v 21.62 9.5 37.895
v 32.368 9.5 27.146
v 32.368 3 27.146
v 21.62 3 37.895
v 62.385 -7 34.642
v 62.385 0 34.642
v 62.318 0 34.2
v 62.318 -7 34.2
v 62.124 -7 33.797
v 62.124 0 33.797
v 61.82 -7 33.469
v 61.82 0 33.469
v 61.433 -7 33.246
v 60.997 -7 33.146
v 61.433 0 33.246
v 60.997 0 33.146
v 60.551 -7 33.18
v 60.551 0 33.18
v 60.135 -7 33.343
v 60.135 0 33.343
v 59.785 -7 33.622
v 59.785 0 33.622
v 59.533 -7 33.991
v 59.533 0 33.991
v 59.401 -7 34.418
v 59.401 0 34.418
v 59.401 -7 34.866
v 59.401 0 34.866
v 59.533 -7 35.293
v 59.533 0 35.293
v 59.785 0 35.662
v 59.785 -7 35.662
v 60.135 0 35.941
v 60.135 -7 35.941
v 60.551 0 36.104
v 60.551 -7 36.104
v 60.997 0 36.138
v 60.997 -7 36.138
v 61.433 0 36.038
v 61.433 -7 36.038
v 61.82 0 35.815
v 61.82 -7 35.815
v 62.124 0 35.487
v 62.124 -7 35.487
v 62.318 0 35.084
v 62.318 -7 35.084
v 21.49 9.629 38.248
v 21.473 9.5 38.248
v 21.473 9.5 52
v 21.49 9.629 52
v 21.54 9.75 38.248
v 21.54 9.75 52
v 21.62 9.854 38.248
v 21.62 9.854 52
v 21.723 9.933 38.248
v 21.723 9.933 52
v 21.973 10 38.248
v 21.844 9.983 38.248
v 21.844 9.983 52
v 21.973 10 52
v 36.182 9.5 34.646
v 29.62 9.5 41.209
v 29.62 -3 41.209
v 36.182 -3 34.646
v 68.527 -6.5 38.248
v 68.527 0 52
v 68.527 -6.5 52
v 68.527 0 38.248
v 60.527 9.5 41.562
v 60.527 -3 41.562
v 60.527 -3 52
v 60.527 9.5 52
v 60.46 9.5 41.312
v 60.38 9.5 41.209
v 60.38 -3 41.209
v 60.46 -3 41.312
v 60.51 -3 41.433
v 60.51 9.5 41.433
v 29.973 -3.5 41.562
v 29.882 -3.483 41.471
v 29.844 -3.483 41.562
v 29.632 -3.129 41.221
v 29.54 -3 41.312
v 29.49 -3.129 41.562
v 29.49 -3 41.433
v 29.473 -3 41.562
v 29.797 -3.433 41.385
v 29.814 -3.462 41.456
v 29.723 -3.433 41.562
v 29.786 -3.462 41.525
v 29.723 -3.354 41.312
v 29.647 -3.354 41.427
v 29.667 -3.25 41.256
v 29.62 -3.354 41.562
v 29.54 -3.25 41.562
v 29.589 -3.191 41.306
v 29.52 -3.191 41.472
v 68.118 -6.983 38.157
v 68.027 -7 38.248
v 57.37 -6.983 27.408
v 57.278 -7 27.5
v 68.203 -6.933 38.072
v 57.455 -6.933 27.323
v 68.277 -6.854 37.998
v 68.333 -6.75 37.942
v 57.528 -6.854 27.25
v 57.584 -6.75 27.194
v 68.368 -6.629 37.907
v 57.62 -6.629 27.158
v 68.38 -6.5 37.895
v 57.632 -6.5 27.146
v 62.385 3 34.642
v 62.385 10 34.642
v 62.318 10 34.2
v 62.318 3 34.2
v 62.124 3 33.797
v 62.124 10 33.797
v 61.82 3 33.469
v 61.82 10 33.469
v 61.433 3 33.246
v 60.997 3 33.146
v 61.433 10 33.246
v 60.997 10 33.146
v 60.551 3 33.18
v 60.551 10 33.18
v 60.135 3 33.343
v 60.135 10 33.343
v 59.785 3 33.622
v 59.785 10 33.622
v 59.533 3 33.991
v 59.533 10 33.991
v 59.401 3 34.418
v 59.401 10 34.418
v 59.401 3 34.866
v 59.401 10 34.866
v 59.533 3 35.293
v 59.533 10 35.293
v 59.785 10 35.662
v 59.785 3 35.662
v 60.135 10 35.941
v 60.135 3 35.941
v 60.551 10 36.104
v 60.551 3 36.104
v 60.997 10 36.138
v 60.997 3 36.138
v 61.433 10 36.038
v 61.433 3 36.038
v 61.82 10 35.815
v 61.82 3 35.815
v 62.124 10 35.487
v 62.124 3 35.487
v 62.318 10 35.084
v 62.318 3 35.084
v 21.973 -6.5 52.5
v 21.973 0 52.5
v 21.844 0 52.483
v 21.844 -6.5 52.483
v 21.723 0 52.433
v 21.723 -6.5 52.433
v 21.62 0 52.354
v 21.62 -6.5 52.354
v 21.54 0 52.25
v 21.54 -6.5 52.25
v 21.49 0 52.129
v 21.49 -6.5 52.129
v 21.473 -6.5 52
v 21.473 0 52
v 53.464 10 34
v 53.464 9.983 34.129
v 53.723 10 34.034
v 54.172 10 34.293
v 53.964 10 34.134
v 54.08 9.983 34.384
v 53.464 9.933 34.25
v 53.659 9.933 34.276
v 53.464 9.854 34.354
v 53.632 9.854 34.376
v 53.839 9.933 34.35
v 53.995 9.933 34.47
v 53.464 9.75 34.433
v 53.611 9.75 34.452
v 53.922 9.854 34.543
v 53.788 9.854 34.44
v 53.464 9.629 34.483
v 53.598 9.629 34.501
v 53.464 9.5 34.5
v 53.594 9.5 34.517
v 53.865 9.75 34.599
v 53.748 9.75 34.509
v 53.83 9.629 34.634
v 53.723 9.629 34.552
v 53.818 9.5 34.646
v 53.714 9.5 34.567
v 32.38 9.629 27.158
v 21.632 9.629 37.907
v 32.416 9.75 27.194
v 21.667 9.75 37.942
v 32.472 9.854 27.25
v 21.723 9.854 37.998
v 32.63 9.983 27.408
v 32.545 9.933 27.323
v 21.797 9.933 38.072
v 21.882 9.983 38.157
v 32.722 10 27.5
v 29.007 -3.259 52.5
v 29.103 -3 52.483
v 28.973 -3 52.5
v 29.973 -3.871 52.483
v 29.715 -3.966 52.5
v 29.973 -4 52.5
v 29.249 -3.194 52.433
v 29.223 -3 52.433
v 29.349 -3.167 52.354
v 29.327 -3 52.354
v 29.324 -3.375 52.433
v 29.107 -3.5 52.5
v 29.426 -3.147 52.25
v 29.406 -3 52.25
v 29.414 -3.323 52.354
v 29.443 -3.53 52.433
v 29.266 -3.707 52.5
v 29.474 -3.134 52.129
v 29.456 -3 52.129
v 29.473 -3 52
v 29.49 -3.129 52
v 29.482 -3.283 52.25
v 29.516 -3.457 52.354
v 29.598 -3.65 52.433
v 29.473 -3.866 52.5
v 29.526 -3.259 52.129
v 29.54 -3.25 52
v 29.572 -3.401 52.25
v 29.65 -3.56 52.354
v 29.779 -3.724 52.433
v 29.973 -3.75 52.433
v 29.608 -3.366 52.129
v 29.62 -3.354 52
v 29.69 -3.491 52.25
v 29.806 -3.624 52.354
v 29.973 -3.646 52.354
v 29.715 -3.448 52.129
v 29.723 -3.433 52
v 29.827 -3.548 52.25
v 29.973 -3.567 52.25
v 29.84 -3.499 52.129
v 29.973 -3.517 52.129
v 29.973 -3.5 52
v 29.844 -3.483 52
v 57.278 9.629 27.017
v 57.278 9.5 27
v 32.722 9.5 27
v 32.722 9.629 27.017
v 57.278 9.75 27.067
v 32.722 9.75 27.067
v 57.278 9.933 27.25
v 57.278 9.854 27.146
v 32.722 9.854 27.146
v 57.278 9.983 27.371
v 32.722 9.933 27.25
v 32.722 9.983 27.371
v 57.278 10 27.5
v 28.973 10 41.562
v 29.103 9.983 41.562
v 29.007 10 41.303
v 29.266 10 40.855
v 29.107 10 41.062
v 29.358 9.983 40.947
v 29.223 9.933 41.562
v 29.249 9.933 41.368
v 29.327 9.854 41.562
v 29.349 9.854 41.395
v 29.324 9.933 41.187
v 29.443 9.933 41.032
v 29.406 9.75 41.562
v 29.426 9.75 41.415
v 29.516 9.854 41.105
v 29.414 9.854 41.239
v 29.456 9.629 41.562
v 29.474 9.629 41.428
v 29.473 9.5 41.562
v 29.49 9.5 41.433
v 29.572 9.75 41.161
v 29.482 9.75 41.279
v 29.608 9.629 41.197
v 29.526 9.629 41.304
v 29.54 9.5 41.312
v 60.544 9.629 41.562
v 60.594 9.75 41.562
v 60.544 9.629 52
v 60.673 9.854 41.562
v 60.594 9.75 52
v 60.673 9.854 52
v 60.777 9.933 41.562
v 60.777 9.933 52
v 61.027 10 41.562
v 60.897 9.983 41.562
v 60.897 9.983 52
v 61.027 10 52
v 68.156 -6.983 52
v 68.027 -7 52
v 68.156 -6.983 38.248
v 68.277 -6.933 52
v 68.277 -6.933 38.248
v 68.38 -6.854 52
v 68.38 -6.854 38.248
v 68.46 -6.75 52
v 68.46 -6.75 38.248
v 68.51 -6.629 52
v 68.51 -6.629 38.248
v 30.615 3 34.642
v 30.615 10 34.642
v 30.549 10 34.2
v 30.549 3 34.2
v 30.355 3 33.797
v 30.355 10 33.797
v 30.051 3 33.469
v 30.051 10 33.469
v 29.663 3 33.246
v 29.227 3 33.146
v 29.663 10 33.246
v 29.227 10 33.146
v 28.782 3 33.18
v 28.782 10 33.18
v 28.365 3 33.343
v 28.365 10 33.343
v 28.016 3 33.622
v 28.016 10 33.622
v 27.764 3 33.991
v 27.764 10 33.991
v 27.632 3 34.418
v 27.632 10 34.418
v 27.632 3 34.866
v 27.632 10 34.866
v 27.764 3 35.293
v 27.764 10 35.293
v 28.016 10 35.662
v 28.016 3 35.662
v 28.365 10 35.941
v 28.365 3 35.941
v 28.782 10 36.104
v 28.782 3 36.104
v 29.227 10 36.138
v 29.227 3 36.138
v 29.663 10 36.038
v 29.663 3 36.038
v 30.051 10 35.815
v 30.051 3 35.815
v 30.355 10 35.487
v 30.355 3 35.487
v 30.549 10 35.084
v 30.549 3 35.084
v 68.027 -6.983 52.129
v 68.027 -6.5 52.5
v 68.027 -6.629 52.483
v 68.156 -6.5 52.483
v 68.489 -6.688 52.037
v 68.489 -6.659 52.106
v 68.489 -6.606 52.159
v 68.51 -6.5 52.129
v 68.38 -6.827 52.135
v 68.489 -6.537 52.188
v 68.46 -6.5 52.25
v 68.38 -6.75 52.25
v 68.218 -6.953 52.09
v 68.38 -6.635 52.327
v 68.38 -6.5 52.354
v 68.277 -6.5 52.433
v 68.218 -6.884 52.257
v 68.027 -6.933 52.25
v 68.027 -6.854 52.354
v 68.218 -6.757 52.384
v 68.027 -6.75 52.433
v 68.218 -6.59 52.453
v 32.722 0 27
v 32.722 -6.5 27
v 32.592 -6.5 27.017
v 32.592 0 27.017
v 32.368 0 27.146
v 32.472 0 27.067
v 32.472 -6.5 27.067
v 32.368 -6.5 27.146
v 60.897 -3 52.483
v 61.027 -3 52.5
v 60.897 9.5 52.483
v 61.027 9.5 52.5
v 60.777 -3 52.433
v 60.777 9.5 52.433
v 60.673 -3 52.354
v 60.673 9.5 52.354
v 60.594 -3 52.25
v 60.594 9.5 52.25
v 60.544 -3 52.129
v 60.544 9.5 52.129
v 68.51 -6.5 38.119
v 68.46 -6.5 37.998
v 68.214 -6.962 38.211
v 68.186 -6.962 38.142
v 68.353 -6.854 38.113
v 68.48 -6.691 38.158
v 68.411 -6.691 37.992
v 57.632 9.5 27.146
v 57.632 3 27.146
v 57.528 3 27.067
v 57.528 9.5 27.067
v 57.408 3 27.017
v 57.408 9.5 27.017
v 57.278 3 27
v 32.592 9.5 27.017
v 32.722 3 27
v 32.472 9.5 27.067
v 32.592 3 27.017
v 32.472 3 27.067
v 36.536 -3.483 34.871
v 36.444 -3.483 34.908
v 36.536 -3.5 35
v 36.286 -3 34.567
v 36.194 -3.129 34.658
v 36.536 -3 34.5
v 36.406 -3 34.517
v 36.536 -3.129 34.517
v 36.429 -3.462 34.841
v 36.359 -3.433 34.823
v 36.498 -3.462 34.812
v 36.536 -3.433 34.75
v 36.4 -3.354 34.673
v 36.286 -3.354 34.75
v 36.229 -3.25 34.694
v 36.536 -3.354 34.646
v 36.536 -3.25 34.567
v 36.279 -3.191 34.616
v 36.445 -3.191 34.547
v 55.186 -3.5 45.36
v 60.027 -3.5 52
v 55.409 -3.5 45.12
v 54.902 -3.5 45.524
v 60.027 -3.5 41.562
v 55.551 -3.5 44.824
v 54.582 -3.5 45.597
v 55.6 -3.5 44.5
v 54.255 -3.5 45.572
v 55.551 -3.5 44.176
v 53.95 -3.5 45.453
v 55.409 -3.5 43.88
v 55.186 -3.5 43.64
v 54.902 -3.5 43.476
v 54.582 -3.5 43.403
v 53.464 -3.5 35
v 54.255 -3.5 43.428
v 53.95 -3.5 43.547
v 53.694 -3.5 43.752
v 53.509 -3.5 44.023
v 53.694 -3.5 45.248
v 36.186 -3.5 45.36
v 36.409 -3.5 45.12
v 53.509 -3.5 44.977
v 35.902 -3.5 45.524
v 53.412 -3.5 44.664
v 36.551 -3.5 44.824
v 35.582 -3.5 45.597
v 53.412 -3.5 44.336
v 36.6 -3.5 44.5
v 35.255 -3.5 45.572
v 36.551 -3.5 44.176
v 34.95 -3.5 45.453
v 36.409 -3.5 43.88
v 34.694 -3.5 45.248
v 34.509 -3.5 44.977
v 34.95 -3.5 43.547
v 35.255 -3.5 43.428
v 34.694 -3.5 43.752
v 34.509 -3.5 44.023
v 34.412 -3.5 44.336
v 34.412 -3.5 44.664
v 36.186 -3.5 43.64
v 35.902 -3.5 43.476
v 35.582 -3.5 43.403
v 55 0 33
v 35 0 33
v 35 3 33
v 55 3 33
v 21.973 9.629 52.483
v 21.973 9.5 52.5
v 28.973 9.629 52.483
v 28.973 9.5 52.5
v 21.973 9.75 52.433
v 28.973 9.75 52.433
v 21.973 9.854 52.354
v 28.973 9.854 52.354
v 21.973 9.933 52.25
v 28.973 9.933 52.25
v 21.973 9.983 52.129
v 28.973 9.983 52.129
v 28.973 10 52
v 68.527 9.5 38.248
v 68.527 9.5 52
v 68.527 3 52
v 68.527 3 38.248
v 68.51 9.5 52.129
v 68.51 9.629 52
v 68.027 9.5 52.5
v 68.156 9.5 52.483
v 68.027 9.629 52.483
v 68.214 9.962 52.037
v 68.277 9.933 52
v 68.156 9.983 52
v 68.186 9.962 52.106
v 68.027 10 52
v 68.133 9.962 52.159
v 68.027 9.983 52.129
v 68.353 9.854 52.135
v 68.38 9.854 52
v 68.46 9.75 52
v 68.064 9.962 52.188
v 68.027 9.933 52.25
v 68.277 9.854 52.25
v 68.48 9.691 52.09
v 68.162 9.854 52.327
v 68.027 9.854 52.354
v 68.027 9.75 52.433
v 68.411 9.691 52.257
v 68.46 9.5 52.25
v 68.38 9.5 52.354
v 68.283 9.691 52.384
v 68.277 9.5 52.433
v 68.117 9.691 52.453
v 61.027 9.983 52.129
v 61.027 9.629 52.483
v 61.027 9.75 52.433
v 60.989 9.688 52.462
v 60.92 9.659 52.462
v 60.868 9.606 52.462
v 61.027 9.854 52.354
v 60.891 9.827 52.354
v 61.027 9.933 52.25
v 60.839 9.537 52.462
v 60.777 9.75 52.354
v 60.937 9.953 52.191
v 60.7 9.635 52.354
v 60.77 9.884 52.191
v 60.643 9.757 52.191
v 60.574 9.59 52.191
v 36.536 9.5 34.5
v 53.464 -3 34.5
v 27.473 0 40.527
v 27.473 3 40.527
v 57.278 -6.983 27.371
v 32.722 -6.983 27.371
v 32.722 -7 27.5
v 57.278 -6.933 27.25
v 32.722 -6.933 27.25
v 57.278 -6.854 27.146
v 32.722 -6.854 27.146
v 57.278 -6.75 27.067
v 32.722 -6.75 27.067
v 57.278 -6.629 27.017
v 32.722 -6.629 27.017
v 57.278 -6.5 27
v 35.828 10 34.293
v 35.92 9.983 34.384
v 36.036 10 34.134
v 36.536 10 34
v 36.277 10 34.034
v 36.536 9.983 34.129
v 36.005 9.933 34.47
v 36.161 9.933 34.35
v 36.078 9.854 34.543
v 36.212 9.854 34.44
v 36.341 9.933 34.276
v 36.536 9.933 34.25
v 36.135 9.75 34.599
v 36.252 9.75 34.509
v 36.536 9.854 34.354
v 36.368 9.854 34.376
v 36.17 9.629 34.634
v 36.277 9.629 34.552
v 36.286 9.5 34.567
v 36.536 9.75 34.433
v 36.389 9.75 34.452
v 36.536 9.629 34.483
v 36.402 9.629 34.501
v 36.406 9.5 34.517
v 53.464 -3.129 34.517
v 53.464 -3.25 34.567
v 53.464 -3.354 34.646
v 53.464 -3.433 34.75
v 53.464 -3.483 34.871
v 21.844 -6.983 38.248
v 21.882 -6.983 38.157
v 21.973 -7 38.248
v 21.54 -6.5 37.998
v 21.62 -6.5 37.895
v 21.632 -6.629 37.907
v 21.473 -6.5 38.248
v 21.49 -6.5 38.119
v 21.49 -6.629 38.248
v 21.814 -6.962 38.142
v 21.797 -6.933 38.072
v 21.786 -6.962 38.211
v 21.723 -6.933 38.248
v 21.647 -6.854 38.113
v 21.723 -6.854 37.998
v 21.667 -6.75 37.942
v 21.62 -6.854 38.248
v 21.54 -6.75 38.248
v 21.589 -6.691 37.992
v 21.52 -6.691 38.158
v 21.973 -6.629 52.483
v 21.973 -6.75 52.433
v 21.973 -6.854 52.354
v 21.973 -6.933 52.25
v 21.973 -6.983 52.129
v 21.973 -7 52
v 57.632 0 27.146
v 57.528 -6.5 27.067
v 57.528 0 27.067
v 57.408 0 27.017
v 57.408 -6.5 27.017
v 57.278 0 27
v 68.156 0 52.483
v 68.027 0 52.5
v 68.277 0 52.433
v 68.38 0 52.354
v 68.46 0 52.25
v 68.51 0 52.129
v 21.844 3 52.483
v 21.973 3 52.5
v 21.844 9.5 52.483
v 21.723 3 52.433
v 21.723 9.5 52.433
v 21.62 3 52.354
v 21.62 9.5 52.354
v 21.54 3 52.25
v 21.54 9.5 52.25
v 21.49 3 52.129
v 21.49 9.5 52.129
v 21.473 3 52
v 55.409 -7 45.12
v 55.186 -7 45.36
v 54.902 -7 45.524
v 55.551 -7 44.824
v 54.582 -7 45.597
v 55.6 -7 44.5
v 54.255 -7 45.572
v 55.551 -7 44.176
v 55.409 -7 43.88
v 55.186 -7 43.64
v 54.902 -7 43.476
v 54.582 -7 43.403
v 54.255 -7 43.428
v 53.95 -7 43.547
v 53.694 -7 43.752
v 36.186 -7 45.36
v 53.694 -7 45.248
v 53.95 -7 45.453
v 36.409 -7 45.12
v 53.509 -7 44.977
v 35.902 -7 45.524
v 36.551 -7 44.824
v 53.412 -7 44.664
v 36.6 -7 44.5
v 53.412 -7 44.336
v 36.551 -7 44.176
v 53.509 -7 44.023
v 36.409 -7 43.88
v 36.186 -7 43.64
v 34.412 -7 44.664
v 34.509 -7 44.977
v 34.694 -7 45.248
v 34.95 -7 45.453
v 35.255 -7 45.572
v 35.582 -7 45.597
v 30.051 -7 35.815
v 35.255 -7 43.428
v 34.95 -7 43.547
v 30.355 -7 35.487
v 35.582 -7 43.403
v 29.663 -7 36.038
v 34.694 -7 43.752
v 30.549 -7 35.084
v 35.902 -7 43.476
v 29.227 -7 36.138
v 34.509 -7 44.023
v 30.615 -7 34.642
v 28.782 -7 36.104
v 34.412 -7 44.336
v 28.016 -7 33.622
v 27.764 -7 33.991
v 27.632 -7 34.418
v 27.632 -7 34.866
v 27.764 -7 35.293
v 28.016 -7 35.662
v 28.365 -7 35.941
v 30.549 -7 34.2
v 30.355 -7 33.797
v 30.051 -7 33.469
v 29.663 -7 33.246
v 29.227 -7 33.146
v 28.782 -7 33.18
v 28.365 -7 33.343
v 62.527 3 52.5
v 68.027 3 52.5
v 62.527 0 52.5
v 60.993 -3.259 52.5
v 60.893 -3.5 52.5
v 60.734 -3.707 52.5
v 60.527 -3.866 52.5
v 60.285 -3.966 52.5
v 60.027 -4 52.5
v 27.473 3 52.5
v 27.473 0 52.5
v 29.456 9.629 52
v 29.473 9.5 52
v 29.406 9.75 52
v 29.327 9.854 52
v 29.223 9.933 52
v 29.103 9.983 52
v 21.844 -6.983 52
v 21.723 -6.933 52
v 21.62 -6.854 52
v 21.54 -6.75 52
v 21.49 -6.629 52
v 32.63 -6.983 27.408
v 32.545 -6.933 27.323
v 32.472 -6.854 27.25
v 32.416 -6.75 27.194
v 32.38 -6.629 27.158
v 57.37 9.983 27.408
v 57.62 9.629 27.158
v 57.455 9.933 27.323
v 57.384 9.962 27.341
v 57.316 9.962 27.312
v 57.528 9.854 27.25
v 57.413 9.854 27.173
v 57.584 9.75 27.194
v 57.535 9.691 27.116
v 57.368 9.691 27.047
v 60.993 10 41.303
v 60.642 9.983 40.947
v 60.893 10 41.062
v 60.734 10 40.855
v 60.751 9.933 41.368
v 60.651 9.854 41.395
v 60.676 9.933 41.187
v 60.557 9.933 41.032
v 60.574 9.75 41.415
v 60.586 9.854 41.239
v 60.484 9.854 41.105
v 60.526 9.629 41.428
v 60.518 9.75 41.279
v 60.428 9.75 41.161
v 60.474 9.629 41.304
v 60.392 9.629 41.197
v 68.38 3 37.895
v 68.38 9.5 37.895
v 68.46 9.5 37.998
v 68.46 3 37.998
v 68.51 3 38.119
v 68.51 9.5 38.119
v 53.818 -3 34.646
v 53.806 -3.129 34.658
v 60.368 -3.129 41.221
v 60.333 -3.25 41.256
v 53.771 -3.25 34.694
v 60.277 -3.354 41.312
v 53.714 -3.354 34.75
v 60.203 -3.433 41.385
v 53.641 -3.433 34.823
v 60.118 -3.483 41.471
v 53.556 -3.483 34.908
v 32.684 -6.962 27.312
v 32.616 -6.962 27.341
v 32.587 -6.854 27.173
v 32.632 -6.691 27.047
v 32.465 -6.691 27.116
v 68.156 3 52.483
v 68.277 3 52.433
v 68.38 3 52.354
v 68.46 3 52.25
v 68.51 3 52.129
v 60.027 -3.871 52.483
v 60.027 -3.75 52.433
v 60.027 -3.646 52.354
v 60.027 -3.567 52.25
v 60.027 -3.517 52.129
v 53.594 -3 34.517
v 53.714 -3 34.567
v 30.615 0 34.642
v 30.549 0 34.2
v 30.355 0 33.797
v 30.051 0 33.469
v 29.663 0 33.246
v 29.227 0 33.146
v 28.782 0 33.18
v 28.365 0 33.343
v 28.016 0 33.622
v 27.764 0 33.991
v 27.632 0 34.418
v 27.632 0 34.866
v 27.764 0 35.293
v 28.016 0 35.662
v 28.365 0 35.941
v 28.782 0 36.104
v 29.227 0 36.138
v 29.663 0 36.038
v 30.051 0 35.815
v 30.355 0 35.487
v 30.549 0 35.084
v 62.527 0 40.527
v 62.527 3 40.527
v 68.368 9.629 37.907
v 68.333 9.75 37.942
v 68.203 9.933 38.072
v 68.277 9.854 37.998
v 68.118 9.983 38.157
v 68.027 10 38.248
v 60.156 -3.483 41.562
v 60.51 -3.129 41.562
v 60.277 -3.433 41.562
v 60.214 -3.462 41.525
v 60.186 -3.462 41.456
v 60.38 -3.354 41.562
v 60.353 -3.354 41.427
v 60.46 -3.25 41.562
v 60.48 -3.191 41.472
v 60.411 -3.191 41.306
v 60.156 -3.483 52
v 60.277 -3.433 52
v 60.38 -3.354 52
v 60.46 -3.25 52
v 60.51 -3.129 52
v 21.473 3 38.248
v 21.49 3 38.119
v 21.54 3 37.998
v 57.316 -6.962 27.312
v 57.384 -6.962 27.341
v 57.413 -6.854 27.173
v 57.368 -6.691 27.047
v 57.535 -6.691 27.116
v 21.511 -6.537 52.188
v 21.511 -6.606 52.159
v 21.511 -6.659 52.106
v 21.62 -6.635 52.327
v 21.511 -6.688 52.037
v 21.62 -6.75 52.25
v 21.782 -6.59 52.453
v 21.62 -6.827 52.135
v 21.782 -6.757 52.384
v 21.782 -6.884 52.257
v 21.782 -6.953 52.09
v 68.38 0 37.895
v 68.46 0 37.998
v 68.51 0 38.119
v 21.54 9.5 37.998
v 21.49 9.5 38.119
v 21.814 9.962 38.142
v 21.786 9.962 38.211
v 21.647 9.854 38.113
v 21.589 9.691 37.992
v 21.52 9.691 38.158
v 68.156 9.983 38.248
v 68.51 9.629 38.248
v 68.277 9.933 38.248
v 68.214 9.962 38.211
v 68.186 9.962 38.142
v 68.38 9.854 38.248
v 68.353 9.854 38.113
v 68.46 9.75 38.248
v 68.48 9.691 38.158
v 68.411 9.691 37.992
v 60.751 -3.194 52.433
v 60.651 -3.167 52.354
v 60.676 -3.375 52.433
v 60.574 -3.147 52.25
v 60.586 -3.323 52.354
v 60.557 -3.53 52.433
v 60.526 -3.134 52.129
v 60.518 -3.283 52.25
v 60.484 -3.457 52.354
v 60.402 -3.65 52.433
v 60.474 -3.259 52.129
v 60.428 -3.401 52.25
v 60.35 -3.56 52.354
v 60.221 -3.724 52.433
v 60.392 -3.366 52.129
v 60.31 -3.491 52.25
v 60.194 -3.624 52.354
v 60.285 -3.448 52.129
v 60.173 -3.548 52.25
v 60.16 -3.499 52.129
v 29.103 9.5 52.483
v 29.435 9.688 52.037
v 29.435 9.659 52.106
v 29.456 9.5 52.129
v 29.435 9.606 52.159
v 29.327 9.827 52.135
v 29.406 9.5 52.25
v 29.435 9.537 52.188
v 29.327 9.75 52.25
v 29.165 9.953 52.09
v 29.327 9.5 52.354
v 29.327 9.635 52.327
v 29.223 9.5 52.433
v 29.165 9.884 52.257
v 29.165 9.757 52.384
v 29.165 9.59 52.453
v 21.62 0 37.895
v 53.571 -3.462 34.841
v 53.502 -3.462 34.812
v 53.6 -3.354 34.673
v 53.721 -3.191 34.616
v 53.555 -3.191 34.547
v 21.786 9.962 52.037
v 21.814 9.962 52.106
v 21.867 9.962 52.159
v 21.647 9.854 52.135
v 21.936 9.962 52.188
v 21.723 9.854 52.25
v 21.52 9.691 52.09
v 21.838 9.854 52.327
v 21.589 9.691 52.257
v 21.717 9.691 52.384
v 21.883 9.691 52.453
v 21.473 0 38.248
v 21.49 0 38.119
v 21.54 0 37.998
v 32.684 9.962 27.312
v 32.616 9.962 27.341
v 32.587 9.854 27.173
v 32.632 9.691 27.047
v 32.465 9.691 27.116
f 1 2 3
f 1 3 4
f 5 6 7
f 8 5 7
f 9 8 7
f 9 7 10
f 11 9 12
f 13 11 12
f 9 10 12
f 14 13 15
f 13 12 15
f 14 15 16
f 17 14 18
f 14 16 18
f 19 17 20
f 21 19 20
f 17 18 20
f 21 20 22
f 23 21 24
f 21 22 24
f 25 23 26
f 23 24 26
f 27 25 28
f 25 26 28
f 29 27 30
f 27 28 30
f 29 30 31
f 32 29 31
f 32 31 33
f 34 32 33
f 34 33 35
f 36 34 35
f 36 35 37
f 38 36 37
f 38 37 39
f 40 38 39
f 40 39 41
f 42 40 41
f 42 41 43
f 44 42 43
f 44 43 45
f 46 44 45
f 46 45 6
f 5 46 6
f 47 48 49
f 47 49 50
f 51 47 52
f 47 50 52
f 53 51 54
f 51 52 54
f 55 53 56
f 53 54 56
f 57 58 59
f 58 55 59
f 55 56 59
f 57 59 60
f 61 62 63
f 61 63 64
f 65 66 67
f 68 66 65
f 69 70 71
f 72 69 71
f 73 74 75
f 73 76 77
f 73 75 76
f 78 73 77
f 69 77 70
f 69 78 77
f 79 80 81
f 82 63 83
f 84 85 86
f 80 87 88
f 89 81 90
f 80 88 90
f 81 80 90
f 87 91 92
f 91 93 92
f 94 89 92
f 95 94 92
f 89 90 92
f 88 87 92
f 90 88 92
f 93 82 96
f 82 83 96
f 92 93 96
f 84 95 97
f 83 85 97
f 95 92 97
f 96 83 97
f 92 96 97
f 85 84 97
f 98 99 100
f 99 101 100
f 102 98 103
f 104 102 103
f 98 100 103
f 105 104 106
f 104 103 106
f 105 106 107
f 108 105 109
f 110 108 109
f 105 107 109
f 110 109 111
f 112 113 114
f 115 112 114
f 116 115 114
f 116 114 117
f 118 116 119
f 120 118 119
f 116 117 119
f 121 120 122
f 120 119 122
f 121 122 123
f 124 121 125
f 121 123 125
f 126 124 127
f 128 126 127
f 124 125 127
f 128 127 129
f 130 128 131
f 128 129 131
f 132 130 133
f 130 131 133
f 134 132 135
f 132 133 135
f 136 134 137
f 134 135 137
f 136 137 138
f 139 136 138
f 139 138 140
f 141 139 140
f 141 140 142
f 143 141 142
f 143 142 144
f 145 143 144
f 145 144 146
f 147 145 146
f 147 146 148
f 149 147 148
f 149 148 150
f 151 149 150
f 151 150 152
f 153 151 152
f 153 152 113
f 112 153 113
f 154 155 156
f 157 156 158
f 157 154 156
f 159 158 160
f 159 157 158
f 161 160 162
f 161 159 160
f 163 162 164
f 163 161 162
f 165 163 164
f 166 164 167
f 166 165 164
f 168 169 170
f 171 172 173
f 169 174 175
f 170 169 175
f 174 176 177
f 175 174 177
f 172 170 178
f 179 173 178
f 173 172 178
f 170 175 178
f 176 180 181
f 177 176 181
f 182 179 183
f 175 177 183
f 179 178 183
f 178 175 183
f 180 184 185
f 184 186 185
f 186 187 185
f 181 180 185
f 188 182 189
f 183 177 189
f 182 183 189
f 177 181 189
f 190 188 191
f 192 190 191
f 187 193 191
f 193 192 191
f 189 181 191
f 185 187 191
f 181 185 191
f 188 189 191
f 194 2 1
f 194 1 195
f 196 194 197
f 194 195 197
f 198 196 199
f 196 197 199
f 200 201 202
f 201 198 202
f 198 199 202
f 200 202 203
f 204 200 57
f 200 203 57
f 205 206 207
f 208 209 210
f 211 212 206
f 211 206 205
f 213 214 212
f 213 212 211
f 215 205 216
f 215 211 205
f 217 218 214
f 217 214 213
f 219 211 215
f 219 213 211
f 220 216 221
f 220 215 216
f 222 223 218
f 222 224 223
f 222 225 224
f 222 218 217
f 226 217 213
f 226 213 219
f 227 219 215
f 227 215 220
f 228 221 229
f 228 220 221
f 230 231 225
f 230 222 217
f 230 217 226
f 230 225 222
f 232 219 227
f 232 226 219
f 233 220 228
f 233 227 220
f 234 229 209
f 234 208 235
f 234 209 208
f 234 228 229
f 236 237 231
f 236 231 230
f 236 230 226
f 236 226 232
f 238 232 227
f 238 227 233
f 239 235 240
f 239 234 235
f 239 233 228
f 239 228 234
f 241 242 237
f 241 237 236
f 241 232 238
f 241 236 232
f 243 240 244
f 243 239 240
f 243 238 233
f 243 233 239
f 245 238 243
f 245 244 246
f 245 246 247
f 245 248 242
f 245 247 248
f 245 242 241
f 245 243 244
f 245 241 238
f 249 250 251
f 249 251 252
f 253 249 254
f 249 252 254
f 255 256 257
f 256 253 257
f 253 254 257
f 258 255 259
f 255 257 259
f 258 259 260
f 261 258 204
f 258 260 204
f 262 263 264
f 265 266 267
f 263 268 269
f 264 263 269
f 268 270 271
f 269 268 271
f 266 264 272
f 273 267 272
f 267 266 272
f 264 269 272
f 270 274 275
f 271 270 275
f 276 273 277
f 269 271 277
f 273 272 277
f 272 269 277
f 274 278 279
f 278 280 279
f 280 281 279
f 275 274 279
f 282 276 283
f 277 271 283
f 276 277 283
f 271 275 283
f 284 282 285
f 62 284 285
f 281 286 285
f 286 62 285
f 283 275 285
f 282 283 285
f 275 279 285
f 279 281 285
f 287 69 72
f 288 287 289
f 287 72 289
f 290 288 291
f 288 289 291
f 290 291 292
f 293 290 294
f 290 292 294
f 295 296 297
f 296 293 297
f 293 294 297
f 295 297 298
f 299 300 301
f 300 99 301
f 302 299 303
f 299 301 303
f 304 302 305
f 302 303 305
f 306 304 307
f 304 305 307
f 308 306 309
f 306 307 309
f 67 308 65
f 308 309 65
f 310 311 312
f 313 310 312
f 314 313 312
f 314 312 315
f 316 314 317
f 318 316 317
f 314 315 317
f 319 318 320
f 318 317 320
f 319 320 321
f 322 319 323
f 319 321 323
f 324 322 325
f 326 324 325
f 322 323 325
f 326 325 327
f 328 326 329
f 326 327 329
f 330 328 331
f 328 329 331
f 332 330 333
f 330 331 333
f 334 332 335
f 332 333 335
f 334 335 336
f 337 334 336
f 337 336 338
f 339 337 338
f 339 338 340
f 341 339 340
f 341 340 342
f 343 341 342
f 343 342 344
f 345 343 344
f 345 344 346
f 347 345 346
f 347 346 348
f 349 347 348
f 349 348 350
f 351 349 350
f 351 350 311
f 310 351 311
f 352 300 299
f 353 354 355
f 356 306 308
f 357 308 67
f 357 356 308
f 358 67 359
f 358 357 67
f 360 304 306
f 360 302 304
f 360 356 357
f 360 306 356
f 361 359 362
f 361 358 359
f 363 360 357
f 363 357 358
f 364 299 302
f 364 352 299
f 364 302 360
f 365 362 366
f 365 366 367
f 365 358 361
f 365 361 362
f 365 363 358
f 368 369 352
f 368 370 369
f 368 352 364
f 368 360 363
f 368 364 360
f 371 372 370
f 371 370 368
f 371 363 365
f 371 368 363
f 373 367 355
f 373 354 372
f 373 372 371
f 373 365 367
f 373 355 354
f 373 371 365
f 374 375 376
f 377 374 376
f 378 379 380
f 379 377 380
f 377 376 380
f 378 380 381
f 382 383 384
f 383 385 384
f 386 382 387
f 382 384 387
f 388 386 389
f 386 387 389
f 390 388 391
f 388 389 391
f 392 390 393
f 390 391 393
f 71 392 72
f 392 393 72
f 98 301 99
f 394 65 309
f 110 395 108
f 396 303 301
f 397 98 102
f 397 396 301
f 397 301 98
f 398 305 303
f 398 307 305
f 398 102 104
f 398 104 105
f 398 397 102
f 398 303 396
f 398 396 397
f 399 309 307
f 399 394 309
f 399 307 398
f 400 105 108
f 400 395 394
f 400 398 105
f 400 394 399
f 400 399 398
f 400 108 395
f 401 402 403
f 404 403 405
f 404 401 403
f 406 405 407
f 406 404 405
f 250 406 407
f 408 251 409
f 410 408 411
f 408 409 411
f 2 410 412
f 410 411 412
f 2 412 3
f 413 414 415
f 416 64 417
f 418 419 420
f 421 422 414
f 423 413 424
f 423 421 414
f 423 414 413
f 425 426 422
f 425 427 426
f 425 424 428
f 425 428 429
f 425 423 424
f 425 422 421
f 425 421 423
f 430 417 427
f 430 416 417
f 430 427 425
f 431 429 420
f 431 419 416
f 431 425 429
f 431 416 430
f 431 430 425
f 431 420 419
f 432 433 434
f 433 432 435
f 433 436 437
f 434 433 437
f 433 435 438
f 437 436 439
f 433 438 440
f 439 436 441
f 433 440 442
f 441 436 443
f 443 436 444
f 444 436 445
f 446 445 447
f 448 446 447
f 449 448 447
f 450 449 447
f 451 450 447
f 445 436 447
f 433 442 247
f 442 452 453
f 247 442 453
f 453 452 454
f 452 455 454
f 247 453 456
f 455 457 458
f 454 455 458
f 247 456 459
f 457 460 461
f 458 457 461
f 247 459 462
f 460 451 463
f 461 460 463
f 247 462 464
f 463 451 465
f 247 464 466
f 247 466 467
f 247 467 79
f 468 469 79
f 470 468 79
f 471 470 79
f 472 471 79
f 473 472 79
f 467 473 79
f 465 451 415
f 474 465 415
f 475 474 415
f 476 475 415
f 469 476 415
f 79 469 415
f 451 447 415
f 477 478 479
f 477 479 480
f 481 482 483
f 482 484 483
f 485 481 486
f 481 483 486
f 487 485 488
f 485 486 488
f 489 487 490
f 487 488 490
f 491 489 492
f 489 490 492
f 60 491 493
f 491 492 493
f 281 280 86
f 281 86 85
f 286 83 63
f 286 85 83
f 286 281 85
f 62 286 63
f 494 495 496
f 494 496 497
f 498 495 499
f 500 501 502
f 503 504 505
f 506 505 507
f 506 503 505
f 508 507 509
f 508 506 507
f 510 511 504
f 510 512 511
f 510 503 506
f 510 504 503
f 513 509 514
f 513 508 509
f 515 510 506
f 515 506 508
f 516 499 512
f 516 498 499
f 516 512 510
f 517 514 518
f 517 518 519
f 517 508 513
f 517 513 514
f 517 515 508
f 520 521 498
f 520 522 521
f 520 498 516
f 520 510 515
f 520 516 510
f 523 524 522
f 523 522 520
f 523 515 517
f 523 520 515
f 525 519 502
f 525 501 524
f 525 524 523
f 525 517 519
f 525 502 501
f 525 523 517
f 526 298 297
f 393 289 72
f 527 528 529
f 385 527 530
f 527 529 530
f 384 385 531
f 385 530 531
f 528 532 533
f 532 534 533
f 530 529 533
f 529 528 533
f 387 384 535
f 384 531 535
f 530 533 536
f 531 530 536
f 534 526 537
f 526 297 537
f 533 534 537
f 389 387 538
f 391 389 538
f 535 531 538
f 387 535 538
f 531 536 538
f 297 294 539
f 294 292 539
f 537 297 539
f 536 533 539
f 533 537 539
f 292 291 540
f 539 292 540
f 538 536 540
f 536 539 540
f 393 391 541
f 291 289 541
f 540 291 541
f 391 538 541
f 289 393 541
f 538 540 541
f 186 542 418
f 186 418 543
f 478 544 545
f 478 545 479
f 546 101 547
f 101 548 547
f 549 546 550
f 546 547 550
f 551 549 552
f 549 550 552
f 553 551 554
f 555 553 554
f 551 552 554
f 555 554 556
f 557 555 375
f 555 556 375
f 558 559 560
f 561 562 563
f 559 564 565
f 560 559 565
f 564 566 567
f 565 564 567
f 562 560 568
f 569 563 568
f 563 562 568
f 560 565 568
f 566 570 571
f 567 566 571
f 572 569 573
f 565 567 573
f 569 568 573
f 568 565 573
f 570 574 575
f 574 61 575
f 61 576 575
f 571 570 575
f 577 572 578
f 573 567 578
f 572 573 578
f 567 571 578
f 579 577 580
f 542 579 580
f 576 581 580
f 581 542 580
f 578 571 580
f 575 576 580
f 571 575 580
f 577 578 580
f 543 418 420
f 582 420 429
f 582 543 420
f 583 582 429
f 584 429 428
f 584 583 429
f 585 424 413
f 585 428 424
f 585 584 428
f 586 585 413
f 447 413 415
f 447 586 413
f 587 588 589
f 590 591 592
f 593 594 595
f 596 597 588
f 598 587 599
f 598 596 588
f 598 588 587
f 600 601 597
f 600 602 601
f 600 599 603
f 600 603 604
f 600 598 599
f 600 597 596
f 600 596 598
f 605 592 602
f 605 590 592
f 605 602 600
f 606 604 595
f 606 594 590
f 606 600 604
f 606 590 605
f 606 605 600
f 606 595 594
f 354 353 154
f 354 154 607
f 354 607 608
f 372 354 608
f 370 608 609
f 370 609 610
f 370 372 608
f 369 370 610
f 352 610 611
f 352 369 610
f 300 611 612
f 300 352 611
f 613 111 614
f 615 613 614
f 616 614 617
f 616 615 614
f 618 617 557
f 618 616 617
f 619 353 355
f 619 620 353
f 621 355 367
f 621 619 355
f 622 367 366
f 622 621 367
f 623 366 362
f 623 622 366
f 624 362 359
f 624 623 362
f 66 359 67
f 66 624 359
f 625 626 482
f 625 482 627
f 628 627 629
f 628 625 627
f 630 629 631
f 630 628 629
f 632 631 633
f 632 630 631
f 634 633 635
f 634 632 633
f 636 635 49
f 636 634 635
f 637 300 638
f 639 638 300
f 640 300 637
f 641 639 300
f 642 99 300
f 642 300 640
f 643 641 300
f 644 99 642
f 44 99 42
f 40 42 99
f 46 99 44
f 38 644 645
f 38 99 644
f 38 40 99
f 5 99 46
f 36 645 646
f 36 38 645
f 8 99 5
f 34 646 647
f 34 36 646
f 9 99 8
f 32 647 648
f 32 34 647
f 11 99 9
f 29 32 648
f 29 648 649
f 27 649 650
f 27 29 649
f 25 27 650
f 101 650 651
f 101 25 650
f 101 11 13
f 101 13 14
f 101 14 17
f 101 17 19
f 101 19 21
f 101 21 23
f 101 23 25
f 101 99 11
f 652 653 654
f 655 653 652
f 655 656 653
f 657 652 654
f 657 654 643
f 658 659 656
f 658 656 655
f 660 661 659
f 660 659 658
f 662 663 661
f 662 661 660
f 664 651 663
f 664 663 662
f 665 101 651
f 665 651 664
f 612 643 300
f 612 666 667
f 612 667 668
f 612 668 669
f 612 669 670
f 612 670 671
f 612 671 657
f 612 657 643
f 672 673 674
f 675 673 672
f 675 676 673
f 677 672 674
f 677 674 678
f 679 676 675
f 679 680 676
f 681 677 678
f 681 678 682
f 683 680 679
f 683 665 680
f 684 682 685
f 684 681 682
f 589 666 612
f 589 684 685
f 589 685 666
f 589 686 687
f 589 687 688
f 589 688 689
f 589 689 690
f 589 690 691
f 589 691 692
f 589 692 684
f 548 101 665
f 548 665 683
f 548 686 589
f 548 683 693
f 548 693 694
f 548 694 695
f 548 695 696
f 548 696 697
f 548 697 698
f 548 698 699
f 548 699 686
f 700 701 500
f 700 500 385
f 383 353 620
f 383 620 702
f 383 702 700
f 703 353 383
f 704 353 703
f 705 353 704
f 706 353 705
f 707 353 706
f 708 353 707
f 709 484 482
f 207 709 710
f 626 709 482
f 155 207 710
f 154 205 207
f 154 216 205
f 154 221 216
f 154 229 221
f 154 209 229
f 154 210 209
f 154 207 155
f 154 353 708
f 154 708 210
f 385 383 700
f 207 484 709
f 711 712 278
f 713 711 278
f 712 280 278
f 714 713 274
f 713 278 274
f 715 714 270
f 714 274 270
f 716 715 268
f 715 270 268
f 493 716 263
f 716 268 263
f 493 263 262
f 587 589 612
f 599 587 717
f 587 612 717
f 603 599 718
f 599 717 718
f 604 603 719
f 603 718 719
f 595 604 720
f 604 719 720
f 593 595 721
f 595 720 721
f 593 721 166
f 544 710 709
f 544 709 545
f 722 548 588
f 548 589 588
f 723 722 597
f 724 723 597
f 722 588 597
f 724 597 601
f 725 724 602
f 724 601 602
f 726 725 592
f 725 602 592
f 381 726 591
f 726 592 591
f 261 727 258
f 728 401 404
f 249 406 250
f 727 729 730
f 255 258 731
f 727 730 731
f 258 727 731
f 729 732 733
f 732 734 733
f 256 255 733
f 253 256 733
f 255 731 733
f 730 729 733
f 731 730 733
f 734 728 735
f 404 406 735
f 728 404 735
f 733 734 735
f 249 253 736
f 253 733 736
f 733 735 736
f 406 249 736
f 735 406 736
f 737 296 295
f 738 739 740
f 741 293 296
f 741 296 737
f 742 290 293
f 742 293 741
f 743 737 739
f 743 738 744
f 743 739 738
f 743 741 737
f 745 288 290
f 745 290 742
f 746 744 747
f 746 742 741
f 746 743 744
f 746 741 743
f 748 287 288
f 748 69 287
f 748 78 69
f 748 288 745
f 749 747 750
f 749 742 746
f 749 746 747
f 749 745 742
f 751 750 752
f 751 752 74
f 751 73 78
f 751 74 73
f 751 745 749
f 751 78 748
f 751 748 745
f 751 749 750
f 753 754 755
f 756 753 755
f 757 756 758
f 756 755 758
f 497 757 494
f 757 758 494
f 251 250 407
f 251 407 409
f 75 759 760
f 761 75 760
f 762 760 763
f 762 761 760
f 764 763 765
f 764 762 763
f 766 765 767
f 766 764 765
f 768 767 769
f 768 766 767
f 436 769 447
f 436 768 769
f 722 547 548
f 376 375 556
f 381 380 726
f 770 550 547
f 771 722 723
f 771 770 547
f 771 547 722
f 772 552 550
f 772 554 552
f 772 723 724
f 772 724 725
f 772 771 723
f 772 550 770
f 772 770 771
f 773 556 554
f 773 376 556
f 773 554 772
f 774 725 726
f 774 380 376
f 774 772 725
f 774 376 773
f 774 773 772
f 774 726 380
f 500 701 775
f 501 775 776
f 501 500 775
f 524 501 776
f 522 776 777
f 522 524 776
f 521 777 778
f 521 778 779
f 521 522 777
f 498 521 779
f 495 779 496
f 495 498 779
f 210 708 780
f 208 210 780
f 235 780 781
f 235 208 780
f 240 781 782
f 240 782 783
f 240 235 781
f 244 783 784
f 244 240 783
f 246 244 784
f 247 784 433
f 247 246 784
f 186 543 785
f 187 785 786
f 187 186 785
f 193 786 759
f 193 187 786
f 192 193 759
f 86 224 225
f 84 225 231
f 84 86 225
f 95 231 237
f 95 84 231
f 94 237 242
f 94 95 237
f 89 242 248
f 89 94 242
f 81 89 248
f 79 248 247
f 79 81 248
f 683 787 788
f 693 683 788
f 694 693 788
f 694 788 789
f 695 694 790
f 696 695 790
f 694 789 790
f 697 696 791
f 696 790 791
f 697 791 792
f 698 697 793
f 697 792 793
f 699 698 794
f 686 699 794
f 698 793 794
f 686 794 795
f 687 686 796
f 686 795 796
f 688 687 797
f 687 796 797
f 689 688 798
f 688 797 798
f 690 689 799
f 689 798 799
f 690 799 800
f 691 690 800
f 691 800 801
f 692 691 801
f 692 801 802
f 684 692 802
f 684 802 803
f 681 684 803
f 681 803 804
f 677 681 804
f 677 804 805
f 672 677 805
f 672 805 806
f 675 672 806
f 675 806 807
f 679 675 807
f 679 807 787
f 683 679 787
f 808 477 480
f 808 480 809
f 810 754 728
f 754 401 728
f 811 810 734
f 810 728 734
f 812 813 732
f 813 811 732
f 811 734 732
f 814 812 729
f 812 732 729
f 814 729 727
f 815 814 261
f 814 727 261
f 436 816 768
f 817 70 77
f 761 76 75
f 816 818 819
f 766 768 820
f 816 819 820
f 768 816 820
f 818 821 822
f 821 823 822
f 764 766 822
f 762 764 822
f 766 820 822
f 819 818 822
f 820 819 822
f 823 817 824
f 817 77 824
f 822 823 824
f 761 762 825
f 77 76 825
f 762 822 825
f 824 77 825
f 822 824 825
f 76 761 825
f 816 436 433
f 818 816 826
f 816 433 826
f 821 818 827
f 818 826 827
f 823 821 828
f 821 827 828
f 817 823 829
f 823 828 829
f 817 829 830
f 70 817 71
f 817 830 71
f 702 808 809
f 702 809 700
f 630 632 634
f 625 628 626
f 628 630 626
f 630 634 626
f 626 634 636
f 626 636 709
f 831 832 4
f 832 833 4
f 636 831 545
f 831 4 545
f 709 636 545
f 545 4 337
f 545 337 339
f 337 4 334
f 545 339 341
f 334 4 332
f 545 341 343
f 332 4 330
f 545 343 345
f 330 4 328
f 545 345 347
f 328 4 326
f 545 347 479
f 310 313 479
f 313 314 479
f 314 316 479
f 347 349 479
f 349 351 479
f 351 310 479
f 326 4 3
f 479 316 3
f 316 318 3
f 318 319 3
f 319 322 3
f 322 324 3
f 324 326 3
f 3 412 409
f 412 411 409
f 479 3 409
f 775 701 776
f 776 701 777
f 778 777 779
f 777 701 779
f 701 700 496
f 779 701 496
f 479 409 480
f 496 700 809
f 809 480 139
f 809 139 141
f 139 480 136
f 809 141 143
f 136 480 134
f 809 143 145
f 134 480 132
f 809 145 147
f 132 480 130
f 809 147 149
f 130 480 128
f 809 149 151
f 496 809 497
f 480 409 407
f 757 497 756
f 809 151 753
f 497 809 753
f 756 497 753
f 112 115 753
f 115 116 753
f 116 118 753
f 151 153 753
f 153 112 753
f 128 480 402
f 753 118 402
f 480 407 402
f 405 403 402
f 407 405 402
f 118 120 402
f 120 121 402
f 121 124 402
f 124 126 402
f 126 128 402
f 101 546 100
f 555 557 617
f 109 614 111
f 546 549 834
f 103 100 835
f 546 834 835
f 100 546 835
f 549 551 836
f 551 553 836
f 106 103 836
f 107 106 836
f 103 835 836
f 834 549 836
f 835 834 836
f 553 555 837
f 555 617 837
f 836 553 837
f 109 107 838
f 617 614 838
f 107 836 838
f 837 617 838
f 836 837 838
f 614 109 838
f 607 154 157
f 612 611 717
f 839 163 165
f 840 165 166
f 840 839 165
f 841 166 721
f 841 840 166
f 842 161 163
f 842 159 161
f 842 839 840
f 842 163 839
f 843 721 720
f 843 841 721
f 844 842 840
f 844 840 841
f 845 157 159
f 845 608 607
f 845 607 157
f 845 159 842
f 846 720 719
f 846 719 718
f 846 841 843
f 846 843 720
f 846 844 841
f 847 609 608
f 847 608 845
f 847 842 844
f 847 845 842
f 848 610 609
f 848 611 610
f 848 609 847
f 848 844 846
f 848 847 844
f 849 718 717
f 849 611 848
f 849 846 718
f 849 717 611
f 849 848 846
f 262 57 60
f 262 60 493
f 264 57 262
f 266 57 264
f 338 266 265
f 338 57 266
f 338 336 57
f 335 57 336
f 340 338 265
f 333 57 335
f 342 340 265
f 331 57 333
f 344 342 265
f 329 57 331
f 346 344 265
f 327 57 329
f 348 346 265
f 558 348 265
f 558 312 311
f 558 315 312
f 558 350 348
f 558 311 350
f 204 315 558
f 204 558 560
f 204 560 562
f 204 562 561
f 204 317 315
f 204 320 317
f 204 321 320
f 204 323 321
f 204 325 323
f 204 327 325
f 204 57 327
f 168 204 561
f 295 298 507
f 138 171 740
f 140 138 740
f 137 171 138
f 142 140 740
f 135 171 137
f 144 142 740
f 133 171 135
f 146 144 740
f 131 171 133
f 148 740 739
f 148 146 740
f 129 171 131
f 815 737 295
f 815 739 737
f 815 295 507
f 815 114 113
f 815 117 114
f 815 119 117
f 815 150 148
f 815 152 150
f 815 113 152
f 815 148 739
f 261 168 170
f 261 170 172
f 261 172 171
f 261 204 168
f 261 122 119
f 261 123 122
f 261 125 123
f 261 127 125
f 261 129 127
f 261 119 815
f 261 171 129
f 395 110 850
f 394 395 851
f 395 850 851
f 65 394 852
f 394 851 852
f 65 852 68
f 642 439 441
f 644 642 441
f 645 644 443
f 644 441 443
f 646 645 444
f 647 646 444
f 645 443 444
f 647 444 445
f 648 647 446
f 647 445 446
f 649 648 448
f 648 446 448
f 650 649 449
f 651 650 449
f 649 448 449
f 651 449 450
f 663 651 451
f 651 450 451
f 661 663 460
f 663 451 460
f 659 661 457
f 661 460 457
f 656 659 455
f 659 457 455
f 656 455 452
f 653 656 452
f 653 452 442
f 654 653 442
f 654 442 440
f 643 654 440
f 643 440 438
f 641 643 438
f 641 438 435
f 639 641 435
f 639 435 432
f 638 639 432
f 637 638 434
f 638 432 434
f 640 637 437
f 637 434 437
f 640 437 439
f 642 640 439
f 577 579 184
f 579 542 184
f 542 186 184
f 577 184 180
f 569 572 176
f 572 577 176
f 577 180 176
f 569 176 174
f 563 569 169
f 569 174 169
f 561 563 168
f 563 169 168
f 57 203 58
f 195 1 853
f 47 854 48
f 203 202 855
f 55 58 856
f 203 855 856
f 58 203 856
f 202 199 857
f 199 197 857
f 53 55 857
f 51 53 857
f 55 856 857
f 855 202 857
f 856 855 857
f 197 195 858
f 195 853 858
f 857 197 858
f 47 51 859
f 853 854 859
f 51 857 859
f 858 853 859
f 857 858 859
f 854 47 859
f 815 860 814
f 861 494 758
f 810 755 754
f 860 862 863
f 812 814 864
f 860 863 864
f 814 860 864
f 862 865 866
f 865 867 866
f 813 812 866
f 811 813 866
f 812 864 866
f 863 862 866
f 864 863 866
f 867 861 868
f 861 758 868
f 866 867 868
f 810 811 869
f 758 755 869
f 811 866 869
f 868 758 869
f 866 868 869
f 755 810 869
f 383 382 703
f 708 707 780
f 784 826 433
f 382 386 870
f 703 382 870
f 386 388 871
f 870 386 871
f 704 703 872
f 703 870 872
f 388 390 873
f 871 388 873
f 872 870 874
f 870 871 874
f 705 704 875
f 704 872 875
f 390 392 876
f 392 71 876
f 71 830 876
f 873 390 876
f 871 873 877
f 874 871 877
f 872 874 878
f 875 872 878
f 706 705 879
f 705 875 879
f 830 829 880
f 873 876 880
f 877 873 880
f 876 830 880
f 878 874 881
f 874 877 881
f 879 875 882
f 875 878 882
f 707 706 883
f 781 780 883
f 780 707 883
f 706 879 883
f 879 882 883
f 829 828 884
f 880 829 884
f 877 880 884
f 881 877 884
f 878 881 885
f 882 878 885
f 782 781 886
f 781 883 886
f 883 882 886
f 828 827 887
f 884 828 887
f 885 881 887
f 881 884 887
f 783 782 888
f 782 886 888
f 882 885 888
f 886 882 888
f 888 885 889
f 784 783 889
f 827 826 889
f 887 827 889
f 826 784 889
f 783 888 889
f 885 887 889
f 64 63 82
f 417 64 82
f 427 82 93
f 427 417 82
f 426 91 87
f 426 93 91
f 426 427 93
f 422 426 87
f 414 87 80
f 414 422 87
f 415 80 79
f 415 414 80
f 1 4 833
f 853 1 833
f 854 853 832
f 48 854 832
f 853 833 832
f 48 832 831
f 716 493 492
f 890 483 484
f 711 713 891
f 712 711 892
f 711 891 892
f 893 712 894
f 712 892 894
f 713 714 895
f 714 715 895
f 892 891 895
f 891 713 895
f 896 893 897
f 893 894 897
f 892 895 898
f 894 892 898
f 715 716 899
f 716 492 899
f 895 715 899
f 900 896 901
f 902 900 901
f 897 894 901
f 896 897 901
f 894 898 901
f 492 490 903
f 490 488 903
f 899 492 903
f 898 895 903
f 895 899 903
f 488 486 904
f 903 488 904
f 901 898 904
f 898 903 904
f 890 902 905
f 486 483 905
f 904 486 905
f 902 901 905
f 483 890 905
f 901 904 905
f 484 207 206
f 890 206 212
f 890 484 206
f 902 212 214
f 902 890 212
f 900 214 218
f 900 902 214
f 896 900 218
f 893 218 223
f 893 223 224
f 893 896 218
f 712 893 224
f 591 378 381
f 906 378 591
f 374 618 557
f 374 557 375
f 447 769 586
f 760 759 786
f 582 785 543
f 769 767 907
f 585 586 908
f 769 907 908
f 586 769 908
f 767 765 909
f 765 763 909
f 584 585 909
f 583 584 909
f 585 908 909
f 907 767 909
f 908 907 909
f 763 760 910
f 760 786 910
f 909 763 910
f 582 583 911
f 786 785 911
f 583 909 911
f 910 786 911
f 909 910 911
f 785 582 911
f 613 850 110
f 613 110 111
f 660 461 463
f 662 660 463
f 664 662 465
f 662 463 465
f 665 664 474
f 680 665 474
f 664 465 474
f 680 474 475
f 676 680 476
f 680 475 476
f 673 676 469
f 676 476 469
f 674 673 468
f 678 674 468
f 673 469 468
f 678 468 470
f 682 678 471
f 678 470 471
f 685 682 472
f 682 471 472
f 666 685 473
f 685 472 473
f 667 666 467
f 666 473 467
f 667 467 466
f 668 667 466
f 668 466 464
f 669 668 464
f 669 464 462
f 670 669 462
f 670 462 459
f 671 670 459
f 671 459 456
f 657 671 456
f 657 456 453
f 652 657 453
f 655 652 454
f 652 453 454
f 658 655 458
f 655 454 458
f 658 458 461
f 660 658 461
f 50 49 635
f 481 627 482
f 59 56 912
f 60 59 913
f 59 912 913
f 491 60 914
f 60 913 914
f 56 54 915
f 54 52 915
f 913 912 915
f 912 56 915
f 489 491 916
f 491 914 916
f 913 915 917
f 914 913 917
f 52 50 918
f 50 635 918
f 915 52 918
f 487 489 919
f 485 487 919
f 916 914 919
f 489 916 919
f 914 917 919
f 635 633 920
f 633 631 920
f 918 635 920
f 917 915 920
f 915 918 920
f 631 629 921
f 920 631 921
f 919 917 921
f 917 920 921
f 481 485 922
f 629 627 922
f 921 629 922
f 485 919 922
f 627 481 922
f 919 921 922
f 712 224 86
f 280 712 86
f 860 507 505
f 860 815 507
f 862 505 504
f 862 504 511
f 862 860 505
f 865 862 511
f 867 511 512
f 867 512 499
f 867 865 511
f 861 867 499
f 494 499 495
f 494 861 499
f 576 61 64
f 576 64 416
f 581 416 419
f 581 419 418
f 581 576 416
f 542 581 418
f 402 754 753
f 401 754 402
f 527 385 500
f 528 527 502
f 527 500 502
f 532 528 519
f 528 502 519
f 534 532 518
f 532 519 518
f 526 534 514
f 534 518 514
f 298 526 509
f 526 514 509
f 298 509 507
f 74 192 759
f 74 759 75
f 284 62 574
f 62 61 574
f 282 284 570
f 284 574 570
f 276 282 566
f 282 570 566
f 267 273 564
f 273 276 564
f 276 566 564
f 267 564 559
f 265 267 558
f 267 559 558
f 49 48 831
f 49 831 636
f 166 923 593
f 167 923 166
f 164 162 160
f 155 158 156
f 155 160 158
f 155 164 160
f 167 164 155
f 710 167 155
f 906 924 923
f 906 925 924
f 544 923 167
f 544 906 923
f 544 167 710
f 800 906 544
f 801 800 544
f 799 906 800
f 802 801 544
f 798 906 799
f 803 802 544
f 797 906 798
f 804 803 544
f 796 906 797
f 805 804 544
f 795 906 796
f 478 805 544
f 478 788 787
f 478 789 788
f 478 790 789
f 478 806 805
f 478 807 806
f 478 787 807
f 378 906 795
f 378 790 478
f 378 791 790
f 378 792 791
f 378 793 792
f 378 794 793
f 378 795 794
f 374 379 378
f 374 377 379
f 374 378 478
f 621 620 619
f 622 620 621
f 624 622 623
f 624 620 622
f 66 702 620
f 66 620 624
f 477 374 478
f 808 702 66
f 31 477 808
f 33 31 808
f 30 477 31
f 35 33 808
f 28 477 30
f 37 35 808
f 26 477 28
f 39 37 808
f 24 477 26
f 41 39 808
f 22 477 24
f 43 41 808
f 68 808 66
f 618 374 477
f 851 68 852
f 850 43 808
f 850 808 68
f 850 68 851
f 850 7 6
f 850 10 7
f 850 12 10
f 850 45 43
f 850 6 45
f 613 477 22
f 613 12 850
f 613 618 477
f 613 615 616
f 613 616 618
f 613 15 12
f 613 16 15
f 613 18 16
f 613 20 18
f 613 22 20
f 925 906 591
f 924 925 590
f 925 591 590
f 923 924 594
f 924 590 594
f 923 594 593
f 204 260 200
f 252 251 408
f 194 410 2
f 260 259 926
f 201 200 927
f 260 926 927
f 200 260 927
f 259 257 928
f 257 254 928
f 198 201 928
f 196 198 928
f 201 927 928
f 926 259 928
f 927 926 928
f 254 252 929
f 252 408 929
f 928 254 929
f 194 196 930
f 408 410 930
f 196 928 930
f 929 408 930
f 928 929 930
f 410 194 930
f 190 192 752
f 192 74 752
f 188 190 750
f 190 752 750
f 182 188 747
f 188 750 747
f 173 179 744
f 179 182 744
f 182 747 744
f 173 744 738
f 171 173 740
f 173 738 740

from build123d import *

# Parameters (mm, degrees)
BOSS_EXTRUDE1_DEPTH      = 10
BOSS_EXTRUDE1_DEPTH_BACK = 7
BOSS_EXTRUDE4_START      = -7
BOSS_EXTRUDE4_DEPTH      = 3.5
FILLET1_R                = 0.5
CUT_EXTRUDE1_DEPTH       = 3
SKETCH2_R                = 1.5
CUT_EXTRUDE2_DEPTH       = 17
CUT_EXTRUDE3_START       = -3.5
SKETCH4_R                = 1.1
CUT_EXTRUDE3_DEPTH       = 3.5


with BuildPart() as part:
    # Sketch1 → Boss-Extrude1 (new body, two sides)
    with BuildSketch(Plane(origin=(0, 0, 0), x_dir=(1, 0, 0), z_dir=(0, 1, 0))) as boss_extrude1_sk:
        Polygon((21.473368866, -52.5), (29.473368866, -52.5), (29.473368866, -41.355058259), (36.328427125, -34.5), (53.671572875, -34.5), (60.526631134, -41.355058259), (60.526631134, -52.5), (68.526631134, -52.5), (68.526631134, -38.04134976), (57.485281374, -27), (32.514718626, -27), (21.473368866, -38.04134976), align=None)
    extrude(amount=BOSS_EXTRUDE1_DEPTH)
    extrude(boss_extrude1_sk.sketch, amount=-BOSS_EXTRUDE1_DEPTH_BACK)

    # Sketch1<5> → Boss-Extrude4 (add)
    with BuildSketch(Plane(origin=(0, 0, 0), x_dir=(1, 0, 0), z_dir=(0, 1, 0)).offset(BOSS_EXTRUDE4_START)):
        Polygon((60.526631134, -41.355058259), (60.526631134, -52.5), (29.473368866, -52.5), (29.473368866, -41.355058259), (36.328427125, -34.5), (53.671572875, -34.5), align=None)
    extrude(amount=BOSS_EXTRUDE4_DEPTH)

    # Fillet1
    fillet1_edges = [part.edges().sort_by_distance(p)[0] for p in [
        (45, -7, 52.5),
        (68.526631134, -7, 45.27067488),
        (63.005956254, -7, 32.52067488),
        (21.473368866, 1.5, 52.5),
        (21.473368866, 1.5, 38.04134976),
        (32.514718626, 1.5, 27),
        (57.485281374, 1.5, 27),
        (68.526631134, 1.5, 38.04134976),
        (68.526631134, 1.5, 52.5),
        (45, -7, 27),
        (26.994043746, -7, 32.52067488),
        (68.526631134, 10, 45.27067488),
        (63.005956254, 10, 32.52067488),
        (45, 10, 27),
        (26.994043746, 10, 32.52067488),
        (21.473368866, 10, 45.27067488),
        (25.473368866, 10, 52.5),
        (21.473368866, -7, 45.27067488),
        (60.526631134, 10, 46.927529129),
        (64.526631134, 10, 52.5),
        (29.473368866, 10, 46.927529129),
        (32.900897995, 10, 37.927529129),
        (45, 10, 34.5),
        (57.099102005, 10, 37.927529129),
        (60.526631134, 3.25, 52.5),
        (29.473368866, 3.25, 52.5),
        (29.473368866, 3.25, 41.355058259),
        (36.328427125, 3.25, 34.5),
        (53.671572875, 3.25, 34.5),
        (60.526631134, 3.25, 41.355058259),
        (45, -3.5, 52.5),
        (32.900897995, -3.5, 37.927529129),
        (29.473368866, -3.5, 46.927529129),
        (60.526631134, -3.5, 46.927529129),
        (57.099102005, -3.5, 37.927529129),
        (45, -3.5, 34.5),
    ]]
    fillet(fillet1_edges, radius=FILLET1_R)

    # Sketch1<3> → Cut-Extrude1 (cut)
    with BuildSketch(Plane(origin=(0, 0, 0), x_dir=(1, 0, 0), z_dir=(0, 1, 0))):
        Polygon((21.473368866, -52.5), (27.473368866, -52.5), (27.473368866, -40.526631134), (35, -33), (55, -33), (62.526631134, -40.526631134), (62.526631134, -52.5), (68.526631134, -52.5), (68.526631134, -38.04134976), (57.485281374, -27), (32.514718626, -27), (21.473368866, -38.04134976), align=None)
    extrude(amount=CUT_EXTRUDE1_DEPTH, mode=Mode.SUBTRACT)

    # Sketch2 → Cut-Extrude2 (cut)
    with BuildSketch(Plane(origin=(0, 10, 0), x_dir=(1, 0, 0), z_dir=(0, 1, 0))):
        with Locations((29.11536409, -34.641995223)):
            Circle(SKETCH2_R)
        with Locations((60.88463591, -34.641995223)):
            Circle(SKETCH2_R)
    extrude(amount=-CUT_EXTRUDE2_DEPTH, mode=Mode.SUBTRACT)

    # Sketch4 → Cut-Extrude3 (cut)
    with BuildSketch(Plane(origin=(0, 0, 0), x_dir=(1, 0, 0), z_dir=(0, 1, 0)).offset(CUT_EXTRUDE3_START)):
        with Locations((35.5, -44.5)):
            Circle(SKETCH4_R)
        with Locations((54.5, -44.5)):
            Circle(SKETCH4_R)
    extrude(amount=-CUT_EXTRUDE3_DEPTH, mode=Mode.SUBTRACT)


solid = part.part
